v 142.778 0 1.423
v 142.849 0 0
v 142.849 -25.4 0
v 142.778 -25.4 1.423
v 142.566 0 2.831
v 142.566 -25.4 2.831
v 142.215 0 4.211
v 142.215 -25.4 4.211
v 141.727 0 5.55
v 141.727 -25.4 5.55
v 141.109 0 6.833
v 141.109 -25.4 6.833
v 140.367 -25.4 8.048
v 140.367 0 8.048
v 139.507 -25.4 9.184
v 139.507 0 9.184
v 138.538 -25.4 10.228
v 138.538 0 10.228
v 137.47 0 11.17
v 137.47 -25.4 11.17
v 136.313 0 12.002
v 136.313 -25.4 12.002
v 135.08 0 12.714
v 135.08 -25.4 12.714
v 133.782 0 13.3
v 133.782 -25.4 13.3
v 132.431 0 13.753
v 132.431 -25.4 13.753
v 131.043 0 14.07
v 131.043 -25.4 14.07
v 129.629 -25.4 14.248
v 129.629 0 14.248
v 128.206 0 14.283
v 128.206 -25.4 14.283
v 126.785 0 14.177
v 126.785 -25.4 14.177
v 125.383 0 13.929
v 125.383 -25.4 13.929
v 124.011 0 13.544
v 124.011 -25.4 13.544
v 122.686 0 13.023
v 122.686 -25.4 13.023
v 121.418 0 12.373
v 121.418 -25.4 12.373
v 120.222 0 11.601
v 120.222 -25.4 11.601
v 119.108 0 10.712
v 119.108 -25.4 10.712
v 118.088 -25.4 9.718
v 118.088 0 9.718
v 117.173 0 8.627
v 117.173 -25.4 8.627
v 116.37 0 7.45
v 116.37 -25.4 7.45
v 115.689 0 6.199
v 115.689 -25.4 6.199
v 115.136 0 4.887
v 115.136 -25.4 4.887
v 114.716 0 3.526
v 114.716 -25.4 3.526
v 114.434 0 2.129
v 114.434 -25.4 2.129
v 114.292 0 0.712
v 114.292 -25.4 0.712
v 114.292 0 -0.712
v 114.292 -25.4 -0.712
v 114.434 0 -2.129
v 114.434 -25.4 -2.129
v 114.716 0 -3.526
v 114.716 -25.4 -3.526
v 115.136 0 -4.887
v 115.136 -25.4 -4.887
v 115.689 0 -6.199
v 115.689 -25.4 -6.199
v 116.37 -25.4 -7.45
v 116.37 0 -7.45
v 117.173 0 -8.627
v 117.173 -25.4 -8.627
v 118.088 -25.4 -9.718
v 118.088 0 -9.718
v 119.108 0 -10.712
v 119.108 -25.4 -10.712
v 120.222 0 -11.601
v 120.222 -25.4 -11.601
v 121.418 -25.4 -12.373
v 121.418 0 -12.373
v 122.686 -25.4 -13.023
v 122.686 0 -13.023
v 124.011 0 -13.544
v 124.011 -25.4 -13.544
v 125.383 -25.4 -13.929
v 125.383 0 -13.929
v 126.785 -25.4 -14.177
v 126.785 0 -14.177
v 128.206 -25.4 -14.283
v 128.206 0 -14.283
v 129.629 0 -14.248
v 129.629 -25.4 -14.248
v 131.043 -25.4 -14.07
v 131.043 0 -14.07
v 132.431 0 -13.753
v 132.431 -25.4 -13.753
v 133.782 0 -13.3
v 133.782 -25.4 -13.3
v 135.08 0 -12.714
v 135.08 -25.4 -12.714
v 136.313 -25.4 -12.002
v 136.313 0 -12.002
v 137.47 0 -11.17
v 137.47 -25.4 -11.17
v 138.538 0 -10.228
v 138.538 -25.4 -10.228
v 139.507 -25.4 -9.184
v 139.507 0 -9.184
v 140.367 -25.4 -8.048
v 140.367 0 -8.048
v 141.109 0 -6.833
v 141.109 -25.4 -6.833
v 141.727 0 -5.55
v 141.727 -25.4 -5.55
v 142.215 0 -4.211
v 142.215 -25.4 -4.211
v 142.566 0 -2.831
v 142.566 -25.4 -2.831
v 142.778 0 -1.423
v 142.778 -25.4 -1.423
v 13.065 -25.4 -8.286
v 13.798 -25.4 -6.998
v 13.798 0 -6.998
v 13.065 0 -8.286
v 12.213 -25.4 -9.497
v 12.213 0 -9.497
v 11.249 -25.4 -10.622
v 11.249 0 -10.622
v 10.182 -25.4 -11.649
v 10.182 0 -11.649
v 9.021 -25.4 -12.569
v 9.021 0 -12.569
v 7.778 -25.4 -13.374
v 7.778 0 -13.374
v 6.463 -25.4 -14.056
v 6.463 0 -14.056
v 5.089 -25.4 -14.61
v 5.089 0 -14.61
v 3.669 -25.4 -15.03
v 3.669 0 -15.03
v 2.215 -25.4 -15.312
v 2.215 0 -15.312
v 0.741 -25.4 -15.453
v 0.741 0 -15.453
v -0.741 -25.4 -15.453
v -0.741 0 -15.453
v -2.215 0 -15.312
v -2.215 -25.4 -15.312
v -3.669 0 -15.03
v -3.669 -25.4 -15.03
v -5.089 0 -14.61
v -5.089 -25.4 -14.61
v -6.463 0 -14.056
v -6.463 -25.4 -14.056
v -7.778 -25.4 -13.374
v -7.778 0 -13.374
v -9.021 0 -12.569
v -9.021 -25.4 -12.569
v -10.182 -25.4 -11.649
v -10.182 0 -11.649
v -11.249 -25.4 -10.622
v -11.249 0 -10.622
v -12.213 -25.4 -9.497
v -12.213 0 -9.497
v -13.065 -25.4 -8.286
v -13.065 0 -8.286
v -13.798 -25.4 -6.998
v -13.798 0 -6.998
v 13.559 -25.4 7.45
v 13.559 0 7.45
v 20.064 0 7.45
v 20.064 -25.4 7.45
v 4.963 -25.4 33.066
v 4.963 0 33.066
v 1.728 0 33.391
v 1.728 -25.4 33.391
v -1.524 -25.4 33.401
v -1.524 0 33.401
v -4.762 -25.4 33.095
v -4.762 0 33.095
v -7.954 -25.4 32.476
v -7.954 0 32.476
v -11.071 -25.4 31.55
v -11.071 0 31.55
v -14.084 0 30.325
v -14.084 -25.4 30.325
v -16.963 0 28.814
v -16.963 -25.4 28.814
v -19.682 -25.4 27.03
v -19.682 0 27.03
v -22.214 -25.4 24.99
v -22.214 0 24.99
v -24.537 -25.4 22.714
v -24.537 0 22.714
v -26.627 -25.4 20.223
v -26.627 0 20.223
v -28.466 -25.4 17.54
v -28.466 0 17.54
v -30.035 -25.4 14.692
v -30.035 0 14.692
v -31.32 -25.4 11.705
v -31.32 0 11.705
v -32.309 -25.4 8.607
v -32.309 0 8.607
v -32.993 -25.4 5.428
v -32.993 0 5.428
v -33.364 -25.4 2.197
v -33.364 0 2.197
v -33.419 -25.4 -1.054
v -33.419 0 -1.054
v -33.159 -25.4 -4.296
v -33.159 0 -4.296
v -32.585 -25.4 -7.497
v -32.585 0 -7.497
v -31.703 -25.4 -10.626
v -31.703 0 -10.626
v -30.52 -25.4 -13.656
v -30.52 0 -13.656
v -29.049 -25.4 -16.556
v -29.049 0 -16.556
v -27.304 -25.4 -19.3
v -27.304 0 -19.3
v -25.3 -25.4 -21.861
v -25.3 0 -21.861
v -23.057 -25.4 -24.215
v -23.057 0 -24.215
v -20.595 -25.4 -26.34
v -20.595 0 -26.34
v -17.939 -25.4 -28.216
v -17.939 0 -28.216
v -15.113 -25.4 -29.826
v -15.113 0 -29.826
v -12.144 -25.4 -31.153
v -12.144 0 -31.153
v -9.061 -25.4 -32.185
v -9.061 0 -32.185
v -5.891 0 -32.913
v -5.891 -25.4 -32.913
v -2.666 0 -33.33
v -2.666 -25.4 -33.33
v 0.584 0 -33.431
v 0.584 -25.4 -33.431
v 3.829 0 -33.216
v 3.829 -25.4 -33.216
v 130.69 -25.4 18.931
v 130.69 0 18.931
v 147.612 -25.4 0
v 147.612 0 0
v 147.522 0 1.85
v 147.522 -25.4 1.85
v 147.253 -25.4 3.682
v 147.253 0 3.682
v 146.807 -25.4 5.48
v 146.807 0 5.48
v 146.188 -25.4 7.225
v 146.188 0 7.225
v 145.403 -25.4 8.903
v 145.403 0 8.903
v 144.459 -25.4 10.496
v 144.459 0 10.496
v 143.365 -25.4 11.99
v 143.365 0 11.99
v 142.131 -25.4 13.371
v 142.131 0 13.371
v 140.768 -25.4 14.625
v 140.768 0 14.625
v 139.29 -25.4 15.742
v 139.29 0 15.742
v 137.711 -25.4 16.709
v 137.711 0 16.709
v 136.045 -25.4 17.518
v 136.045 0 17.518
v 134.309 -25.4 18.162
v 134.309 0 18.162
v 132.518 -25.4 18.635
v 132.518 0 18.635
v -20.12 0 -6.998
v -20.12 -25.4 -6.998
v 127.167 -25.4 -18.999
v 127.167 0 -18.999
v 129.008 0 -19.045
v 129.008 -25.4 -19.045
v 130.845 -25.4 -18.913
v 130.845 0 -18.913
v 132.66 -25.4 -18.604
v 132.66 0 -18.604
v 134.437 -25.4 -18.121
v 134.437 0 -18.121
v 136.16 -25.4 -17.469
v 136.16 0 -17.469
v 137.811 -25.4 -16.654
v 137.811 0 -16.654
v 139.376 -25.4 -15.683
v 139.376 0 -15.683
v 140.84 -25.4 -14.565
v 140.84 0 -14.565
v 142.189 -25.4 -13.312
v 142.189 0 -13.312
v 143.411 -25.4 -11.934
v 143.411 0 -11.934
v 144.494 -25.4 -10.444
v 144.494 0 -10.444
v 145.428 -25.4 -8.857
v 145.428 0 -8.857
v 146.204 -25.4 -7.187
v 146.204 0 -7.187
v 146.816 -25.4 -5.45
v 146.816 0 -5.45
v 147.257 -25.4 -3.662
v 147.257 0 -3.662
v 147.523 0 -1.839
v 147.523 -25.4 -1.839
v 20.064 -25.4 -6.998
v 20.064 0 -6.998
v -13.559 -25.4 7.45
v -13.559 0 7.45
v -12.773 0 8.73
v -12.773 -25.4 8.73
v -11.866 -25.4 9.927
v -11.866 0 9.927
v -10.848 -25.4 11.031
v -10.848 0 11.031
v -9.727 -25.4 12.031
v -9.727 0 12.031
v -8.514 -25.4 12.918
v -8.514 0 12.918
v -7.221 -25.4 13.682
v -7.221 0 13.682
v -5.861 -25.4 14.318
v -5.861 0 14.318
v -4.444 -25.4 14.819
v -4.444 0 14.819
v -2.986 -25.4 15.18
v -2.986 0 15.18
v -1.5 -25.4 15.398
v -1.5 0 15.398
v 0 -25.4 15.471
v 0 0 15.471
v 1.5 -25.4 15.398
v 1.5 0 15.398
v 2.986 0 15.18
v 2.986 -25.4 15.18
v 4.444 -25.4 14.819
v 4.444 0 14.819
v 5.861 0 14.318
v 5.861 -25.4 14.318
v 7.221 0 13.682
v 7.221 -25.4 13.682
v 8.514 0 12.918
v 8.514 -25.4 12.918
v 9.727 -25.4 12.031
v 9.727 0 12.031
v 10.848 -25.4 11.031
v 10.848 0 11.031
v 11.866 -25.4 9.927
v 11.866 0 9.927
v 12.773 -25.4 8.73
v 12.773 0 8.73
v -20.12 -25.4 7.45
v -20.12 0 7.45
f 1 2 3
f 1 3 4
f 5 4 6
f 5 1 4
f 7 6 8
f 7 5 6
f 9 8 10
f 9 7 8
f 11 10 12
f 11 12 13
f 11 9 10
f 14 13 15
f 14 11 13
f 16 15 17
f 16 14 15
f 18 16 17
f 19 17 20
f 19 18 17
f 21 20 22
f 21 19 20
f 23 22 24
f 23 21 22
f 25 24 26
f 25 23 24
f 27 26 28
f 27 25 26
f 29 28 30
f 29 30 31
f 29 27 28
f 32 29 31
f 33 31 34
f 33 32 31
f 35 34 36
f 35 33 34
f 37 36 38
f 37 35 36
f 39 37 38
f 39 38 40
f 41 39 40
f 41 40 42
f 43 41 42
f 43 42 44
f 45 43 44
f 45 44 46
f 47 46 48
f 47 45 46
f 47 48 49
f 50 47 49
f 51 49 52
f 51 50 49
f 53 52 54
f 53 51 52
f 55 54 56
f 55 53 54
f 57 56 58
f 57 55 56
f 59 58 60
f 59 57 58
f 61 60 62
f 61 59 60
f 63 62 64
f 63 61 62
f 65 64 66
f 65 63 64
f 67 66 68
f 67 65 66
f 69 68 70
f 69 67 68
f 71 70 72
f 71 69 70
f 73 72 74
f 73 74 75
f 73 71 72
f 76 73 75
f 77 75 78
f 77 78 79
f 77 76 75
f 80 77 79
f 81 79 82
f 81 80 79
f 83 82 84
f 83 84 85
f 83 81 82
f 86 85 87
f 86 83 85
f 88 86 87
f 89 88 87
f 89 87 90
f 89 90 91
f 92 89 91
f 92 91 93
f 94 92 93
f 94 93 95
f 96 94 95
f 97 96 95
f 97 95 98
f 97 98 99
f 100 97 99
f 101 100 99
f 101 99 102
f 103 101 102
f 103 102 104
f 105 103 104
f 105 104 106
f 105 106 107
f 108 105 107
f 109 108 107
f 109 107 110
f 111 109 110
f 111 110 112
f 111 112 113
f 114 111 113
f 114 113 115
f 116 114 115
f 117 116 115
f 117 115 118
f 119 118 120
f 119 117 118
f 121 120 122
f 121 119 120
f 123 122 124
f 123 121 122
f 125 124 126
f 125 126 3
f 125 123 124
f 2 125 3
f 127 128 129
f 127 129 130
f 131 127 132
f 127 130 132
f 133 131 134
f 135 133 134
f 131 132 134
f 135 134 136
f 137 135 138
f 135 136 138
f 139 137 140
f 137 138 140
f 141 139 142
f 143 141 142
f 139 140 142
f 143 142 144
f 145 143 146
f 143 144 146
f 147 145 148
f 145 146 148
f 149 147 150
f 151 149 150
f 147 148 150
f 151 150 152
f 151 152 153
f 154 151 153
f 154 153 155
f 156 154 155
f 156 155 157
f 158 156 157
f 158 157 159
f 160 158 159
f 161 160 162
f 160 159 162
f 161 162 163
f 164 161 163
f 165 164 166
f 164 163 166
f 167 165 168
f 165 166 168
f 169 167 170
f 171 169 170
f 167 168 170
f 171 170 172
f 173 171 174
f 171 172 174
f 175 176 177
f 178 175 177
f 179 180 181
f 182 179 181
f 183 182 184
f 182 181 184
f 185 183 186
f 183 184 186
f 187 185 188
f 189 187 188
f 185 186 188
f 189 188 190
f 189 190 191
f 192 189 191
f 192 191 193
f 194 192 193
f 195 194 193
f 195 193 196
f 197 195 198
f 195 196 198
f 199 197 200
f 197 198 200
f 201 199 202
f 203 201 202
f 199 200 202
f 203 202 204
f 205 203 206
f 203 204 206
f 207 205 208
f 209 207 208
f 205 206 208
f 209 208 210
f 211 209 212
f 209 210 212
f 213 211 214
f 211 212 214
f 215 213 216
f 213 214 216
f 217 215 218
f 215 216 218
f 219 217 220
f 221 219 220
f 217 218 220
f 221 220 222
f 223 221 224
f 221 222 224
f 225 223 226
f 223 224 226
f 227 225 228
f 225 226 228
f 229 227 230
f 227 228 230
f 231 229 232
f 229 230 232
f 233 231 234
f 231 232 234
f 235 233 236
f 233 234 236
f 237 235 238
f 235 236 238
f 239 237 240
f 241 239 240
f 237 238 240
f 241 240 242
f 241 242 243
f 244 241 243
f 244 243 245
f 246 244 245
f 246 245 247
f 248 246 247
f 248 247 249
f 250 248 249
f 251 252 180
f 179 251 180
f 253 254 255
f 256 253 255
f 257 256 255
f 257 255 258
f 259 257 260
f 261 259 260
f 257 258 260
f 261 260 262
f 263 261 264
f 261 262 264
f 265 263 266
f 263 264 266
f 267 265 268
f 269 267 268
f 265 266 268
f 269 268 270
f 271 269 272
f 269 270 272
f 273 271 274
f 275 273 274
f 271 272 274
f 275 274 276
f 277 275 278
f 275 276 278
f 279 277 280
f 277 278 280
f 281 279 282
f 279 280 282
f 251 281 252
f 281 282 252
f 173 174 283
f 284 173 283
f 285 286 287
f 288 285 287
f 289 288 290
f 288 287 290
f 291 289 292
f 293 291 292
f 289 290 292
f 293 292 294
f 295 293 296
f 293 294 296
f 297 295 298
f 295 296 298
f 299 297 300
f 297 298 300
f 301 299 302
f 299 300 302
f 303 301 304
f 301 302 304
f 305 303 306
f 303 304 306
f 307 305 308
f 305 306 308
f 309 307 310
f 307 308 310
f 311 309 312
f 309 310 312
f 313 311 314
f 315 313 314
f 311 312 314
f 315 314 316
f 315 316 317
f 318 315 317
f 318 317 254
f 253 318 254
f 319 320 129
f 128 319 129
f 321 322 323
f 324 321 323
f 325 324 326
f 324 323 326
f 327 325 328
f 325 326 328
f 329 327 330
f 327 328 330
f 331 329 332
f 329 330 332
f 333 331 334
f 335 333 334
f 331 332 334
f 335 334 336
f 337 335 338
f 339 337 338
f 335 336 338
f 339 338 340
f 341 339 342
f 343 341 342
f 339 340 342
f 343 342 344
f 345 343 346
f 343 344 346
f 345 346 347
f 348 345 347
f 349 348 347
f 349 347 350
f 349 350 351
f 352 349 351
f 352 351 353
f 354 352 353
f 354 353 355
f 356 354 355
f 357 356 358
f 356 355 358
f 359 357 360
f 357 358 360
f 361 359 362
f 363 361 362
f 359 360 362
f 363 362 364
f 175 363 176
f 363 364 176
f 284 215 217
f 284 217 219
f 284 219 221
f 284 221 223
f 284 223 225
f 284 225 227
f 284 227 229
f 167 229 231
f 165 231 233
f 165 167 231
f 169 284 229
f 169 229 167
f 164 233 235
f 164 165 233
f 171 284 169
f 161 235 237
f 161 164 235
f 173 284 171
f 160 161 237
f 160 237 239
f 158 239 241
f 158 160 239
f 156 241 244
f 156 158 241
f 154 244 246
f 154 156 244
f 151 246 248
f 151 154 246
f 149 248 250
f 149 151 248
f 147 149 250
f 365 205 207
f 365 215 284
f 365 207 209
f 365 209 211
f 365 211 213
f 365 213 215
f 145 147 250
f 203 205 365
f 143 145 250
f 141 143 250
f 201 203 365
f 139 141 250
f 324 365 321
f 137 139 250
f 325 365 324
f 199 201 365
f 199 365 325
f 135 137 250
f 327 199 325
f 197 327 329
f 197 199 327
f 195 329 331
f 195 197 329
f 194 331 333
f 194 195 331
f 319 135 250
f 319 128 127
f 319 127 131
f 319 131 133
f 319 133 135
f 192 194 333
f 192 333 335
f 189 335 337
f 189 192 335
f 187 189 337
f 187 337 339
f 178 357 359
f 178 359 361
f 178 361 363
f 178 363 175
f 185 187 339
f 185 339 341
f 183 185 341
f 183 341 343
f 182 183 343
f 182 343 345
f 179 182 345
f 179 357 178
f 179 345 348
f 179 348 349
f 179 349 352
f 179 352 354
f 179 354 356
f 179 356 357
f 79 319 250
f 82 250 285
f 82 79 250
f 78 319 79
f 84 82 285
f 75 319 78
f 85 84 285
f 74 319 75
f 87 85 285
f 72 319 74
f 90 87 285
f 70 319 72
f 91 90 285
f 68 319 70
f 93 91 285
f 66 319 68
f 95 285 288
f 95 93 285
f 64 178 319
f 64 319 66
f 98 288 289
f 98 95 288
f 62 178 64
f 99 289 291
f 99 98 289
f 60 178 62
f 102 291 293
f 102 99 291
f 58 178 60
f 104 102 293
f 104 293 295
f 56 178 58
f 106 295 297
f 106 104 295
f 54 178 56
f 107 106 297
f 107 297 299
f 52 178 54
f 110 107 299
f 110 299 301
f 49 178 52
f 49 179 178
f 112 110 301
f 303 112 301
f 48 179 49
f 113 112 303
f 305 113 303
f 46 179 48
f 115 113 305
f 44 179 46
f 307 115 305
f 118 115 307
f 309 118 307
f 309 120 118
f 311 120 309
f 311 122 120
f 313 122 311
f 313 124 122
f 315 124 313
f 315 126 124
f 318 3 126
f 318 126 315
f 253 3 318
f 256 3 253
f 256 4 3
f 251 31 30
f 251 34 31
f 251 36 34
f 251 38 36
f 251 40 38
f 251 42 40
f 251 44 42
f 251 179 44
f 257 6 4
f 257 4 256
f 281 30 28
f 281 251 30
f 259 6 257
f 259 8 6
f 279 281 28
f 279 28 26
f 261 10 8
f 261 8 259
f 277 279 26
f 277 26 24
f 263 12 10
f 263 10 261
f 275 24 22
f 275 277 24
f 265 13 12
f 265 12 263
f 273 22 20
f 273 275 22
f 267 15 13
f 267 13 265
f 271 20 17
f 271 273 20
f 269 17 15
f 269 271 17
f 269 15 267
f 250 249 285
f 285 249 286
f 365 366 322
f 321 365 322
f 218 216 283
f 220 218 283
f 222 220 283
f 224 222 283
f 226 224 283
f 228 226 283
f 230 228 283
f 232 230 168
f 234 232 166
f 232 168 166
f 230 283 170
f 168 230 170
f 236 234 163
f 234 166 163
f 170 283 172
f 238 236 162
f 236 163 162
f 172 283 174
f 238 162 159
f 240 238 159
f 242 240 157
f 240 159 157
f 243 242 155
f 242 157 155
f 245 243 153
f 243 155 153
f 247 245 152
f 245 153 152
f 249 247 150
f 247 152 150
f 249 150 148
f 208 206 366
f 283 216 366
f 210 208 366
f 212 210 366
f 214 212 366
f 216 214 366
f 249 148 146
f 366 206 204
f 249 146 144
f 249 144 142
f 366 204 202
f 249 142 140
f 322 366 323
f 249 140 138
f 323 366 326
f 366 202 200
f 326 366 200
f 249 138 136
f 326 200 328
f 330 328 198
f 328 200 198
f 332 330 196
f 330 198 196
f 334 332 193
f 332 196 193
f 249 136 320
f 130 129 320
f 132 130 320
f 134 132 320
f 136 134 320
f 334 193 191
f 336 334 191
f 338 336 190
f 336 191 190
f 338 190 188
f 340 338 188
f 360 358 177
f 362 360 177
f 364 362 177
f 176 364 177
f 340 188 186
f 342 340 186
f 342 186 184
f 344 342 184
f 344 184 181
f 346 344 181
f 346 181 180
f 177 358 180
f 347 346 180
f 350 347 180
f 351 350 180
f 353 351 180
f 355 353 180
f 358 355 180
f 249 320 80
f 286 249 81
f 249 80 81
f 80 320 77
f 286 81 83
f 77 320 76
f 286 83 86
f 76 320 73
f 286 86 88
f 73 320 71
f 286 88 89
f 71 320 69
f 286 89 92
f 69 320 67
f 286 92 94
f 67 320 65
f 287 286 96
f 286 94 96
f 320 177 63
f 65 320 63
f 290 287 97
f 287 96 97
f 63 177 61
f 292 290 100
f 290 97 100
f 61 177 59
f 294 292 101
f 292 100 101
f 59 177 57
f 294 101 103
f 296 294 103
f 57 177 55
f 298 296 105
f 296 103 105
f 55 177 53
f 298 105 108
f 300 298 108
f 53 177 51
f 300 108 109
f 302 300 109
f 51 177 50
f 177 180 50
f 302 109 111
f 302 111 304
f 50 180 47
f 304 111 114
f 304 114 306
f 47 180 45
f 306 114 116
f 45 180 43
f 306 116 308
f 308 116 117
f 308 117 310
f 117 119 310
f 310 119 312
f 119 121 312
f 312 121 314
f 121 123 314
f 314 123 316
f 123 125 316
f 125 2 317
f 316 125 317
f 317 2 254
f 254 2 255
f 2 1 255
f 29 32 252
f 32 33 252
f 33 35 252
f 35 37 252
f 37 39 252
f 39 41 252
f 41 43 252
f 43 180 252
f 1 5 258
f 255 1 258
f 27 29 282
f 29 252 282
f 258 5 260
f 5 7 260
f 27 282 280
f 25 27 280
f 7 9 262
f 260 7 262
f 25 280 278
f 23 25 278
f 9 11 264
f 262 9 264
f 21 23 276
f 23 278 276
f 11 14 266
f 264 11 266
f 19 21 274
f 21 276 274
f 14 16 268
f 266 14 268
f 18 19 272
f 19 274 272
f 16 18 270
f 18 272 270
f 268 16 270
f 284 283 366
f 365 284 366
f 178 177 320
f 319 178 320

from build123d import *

# Parameters (mm, degrees)
F0_R     = 14.2875
F1_DEPTH = 25.4


with BuildPart() as f1:
    # F0 (on Front) → F1 (new body)
    with BuildSketch(Plane.XZ):
        with BuildLine():
            ThreePointArc((3.828865, -33.216132), (24.959907, -22.248027), (33.436083, 0))
            ThreePointArc((33.436083, 0), (25.336953, 21.817664), (4.963222, 33.065663))
            ThreePointArc((4.963222, 33.065663), (-33.431187, 0.572147), (3.828865, -33.216132))
        make_face()
        with BuildLine():
            ThreePointArc((-13.559361, 7.449858), (0, 15.471156), (13.559361, 7.449858))
            Line((13.559361, 7.449858), (20.06432, 7.449858))
            Line((20.06432, 7.449858), (20.06432, -6.998351))
            Line((20.06432, -6.998351), (13.797816, -6.998351))
            ThreePointArc((13.797816, -6.998351), (0, -15.471156), (-13.797816, -6.998351))
            Line((-13.797816, -6.998351), (-20.11976, -6.998351))
            Line((-20.11976, -6.998351), (-20.11976, 7.449858))
            Line((-20.11976, 7.449858), (-13.559361, 7.449858))
        make_face(mode=Mode.SUBTRACT)
        with BuildLine():
            ThreePointArc((4.963222, 33.065663), (25.336953, 21.817664), (33.436083, 0))
            ThreePointArc((33.436083, 0), (24.959907, -22.248027), (3.828865, -33.216132))
            Line((3.828865, -33.216132), (127.166579, -18.99884))
            ThreePointArc((127.166579, -18.99884), (109.593453, 1.762081), (130.690084, 18.930738))
            Line((130.690084, 18.930738), (4.963222, 33.065663))
        make_face()
        with BuildLine():
            ThreePointArc((147.611783, 0), (142.764717, 12.695637), (130.690084, 18.930738))
            ThreePointArc((130.690084, 18.930738), (109.593453, 1.762081), (127.166579, -18.99884))
            ThreePointArc((127.166579, -18.99884), (141.52951, -13.954948), (147.611783, 0))
        make_face()
        with Locations((128.561783, 0)):
            Circle(F0_R, mode=Mode.SUBTRACT)
    extrude(amount=F1_DEPTH)


solid = f1.part
